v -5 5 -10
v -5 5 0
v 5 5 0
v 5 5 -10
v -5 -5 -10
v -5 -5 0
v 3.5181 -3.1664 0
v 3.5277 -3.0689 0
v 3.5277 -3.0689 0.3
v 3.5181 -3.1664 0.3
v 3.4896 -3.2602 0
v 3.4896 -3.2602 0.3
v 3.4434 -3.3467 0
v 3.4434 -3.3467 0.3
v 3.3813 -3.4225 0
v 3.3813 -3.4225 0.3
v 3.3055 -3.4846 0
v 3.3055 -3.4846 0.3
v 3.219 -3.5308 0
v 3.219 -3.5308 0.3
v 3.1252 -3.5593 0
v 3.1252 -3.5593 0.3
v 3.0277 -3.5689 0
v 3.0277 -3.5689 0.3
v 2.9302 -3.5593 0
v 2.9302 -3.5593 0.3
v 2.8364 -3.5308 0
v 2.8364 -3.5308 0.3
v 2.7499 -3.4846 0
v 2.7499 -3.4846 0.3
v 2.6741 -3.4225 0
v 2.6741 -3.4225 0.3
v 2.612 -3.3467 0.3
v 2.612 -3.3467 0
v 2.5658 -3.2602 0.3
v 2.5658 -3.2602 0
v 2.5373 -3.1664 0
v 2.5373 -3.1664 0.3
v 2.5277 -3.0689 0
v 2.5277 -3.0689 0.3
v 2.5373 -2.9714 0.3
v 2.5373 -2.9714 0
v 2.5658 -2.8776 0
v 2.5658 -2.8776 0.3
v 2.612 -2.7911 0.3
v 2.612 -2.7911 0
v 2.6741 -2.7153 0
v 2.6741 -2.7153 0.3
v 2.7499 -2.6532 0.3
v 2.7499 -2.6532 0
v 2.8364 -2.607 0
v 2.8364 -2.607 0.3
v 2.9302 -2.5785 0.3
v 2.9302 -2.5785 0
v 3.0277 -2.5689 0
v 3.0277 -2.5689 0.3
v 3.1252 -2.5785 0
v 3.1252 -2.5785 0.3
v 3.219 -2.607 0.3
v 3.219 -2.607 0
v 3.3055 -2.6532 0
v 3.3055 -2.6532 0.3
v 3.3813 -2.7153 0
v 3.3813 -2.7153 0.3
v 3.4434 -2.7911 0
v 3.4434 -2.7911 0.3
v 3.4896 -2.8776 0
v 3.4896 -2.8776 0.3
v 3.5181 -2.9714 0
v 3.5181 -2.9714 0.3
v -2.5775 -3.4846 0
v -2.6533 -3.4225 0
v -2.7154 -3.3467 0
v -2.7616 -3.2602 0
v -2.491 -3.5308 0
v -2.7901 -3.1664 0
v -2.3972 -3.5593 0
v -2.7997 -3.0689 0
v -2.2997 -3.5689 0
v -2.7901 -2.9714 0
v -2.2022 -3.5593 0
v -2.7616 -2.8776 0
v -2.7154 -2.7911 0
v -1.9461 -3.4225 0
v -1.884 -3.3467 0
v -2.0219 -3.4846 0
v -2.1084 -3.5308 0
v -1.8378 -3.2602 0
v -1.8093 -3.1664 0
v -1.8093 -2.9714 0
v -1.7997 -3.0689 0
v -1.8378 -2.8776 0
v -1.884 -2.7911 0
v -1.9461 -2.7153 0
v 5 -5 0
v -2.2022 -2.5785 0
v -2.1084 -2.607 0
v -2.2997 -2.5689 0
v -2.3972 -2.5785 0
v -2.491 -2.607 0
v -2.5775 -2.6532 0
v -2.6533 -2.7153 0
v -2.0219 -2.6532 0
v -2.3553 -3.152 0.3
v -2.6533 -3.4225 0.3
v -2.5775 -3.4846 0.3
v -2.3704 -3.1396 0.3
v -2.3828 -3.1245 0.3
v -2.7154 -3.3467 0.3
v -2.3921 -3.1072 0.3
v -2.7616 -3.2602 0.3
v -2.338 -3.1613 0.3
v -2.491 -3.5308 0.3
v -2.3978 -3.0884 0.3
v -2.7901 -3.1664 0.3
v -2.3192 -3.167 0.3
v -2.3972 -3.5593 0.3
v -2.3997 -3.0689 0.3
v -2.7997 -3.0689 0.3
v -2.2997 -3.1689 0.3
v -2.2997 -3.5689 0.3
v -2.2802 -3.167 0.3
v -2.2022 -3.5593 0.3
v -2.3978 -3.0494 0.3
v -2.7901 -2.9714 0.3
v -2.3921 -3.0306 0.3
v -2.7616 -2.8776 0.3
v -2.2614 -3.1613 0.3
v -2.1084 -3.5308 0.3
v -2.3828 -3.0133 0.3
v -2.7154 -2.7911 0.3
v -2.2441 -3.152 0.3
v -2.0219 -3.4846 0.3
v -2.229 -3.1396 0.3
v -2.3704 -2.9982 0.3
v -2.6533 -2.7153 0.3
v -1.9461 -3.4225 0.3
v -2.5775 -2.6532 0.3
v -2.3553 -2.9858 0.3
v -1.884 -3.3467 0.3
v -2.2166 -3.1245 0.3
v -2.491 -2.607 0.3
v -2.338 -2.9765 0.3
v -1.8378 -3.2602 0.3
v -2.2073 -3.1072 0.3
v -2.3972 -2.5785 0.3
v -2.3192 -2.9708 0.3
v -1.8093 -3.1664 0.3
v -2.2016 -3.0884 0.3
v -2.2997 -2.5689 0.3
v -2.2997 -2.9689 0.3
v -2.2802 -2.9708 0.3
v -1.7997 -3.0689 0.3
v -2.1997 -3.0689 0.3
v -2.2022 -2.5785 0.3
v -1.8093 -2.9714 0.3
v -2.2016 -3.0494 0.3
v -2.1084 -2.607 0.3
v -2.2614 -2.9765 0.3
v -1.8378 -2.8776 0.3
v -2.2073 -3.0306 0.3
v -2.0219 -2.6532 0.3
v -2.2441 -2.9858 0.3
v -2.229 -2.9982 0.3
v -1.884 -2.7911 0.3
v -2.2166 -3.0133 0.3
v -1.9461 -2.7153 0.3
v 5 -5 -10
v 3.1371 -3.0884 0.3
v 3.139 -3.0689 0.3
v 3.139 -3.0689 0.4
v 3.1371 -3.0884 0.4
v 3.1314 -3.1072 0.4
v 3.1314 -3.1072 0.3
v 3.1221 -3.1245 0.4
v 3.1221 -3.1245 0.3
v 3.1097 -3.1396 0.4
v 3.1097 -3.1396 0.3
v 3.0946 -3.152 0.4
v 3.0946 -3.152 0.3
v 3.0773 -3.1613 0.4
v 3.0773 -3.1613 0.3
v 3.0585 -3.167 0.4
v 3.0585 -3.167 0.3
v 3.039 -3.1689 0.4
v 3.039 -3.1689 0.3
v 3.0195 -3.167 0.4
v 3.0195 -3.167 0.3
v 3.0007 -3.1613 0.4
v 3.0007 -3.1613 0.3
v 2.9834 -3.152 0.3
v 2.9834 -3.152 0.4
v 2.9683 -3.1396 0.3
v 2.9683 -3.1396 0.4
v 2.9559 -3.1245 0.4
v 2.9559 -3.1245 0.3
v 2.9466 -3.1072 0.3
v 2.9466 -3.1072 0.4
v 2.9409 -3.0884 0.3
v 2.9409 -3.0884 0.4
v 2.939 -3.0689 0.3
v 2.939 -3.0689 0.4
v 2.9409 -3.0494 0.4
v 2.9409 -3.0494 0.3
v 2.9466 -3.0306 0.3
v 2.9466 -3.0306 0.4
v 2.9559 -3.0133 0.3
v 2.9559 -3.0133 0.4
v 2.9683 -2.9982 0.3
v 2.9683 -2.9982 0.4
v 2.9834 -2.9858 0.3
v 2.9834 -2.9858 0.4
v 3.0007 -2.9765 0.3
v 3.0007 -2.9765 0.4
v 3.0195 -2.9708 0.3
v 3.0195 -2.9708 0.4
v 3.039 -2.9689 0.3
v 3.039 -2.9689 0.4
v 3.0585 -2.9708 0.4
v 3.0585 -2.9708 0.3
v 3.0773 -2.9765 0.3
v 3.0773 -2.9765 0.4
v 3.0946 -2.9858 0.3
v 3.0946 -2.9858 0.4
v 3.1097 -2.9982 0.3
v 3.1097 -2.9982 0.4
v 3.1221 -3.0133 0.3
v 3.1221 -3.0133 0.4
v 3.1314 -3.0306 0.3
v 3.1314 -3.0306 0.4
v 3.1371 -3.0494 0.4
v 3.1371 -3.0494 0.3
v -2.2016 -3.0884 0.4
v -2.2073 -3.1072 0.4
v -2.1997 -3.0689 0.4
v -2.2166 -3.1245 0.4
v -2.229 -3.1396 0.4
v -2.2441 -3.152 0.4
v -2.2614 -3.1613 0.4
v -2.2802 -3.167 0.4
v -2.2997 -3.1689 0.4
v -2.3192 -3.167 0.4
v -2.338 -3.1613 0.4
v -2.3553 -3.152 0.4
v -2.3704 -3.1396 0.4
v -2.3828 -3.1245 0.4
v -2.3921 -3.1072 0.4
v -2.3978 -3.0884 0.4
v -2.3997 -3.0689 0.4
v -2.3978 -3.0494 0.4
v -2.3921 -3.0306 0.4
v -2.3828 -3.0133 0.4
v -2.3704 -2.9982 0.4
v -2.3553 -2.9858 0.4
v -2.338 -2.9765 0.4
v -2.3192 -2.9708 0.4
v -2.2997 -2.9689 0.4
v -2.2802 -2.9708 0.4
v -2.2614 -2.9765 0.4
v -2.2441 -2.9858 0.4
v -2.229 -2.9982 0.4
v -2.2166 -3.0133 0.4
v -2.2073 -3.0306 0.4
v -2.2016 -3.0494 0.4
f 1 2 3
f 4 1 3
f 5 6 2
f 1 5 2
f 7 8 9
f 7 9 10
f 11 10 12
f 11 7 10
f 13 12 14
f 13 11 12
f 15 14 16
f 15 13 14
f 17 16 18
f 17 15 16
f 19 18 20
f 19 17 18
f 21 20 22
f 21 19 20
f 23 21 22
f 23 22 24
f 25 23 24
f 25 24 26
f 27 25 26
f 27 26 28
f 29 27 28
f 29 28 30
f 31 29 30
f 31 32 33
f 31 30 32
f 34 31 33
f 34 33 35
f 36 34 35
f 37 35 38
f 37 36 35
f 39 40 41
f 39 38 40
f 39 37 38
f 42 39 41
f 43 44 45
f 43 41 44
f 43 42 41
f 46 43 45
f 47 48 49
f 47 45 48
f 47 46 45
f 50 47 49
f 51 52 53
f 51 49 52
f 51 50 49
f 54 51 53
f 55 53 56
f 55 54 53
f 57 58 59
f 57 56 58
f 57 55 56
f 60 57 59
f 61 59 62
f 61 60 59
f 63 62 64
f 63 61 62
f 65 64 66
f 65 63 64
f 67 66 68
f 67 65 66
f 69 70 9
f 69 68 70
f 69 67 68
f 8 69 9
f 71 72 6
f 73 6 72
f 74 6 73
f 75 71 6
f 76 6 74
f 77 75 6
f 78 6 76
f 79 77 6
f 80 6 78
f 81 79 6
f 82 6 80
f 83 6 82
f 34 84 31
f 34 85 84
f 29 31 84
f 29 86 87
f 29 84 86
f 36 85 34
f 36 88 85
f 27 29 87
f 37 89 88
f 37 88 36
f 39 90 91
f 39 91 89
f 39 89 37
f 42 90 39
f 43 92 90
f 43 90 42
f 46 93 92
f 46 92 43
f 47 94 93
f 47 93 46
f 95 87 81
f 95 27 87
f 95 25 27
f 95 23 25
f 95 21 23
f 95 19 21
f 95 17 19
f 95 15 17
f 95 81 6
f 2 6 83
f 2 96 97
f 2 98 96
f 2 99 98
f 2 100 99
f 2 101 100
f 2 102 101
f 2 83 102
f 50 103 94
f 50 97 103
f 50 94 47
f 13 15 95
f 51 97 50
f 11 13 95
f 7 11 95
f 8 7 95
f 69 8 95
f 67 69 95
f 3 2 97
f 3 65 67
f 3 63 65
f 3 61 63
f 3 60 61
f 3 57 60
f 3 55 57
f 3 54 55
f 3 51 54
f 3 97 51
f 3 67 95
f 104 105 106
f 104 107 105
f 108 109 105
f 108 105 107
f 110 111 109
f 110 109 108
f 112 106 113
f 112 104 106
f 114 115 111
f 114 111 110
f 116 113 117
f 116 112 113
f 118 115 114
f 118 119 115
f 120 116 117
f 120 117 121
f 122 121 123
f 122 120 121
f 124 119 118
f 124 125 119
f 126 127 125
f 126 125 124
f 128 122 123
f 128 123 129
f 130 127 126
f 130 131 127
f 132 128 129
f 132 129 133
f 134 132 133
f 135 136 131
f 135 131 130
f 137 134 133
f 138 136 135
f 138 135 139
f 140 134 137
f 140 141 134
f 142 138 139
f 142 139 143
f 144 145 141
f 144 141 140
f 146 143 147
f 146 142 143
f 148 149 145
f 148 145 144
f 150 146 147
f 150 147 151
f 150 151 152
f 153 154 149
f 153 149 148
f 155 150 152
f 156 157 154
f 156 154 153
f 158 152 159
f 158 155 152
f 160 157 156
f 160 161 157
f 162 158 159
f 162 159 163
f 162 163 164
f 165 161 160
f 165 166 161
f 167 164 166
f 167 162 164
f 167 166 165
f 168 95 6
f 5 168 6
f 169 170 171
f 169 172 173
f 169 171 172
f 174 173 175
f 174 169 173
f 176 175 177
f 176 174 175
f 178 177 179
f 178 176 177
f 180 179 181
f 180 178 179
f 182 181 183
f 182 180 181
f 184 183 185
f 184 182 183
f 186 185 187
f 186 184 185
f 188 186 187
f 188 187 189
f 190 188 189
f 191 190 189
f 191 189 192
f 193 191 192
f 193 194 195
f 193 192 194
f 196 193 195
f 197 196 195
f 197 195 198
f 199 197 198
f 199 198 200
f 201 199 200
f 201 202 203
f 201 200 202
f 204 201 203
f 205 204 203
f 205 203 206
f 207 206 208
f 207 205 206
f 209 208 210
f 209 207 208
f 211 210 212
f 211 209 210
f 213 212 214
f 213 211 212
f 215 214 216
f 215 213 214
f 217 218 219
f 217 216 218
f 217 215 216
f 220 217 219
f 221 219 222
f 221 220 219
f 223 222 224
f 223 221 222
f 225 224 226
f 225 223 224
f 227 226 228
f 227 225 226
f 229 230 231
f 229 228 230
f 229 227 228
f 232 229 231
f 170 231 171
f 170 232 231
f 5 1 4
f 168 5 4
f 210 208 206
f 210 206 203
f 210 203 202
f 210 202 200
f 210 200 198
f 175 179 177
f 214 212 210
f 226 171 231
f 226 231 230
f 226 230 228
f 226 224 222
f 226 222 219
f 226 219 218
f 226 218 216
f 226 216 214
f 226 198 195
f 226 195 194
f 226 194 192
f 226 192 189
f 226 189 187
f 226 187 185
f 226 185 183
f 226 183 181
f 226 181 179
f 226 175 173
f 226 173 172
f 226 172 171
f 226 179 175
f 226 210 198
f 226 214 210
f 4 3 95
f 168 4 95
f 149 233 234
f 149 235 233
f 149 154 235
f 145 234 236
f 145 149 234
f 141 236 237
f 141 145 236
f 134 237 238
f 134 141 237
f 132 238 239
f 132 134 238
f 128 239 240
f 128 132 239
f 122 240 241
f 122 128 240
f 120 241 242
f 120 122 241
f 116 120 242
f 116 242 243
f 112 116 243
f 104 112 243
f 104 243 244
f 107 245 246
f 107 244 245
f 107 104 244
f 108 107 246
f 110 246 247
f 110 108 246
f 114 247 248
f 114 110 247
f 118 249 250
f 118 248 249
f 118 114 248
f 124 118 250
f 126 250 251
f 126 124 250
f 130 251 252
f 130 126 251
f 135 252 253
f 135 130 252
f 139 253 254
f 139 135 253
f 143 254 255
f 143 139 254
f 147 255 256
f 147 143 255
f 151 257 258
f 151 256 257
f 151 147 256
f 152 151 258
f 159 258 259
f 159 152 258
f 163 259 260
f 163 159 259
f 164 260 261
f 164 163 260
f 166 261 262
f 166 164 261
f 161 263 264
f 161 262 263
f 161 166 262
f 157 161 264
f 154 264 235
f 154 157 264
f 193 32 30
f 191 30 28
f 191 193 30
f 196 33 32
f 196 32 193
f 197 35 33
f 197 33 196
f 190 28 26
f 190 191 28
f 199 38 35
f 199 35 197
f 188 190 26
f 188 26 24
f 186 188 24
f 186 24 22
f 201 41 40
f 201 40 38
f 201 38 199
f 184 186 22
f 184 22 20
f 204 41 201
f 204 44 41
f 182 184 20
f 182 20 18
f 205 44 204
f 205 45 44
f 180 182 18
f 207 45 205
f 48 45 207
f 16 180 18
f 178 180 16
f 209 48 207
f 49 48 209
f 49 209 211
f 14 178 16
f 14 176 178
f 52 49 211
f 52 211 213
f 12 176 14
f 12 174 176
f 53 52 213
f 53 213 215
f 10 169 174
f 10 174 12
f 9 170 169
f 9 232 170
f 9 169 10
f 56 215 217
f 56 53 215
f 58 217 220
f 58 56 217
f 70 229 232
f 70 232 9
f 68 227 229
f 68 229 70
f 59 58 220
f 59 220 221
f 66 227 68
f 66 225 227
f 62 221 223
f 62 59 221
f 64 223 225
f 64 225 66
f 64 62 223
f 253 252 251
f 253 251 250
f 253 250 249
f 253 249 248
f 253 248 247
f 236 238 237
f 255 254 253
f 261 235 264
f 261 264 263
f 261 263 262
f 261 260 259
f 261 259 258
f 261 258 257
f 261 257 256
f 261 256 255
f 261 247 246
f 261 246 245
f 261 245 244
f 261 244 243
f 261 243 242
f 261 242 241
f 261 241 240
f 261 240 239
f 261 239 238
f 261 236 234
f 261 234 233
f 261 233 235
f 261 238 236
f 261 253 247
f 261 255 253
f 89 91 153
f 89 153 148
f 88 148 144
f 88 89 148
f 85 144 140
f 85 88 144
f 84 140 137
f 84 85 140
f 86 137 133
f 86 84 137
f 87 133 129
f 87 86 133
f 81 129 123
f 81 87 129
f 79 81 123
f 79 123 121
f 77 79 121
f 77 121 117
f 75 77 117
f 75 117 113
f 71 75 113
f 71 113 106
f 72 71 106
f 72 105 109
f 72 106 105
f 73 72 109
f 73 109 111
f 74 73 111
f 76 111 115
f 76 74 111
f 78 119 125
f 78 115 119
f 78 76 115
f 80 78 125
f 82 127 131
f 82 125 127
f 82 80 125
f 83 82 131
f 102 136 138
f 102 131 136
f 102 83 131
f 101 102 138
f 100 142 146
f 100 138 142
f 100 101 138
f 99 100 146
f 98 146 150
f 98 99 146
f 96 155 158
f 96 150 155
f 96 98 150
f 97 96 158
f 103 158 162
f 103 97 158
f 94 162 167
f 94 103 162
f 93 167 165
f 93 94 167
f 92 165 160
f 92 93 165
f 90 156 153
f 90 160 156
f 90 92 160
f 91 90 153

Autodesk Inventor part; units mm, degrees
ref_plane "YZ Plane" through (0, 0, 0) normal (1, 0, 0) x (0, 1, 0)
ref_plane "XZ Plane" through (0, 0, 0) normal (0, 1, 0) x (-1, 0, 0)
sketch "Эскиз1" plane through (0, 0, 0) normal (0, 0, 1) x (1, 0, 0)
  line L0 (-5, 5) -> (5, 5)
  line L1 (5, 5) -> (5, -5)
  line L2 (5, -5) -> (-5, -5)
  line L3 (-5, -5) -> (-5, 5)
  point P0 (0, 0)
  point P1 (0, 5)
  point P2 (5, 0)
  dimension "d0" = 10
  dimension "d1" = 10
extrude "Выдавливание1" add sketch "Эскиз1" against normal blind 10
sketch "Эскиз2" plane through (0, 0, 0) normal (0, 0, 1) x (1, 0, 0)
  line L0 (-4.6144, 4.1403) -> (8.1453, 4.1403) construction
  line L1 (8.1453, 4.1403) -> (8.1453, 2.1383) construction
  line L2 (8.1453, 2.1383) -> (-4.6144, 2.1383) construction
  line L3 (-4.6144, 2.1383) -> (-4.6144, 4.1403) construction
  point P0 (0, 0)
ref_plane "РабПлоскость1" through (0, 0, 0) normal (0, 0, 1) x (1, 0, 0)
sketch "Эскиз3" plane through (0, 0, 0) normal (0, 0, 1) x (1, 0, 0)
  circle A0 centre (-2.2997, -3.0689) radius 0.5
  circle A1 centre (3.0277, -3.0689) radius 0.5
  point P0 (0, 0)
  dimension "d5" = 1
  dimension "d6" = 1
extrude "Выдавливание2" add sketch "Эскиз3" along normal blind 0.3
sketch "Эскиз4" plane through (0, 0, 0) normal (0, 0, 1) x (1, 0, 0)
  circle A0 centre (-2.2997, -3.0689) radius 0.5 projected
  circle A1 centre (-2.2997, -3.0689) radius 0.1
  circle A2 centre (3.039, -3.0689) radius 0.1
  point P0 (0, 0)
  dimension "d9" = 0.2
  dimension "d10" = 0.2
extrude "Выдавливание3" add sketch "Эскиз4" along normal blind 0.4 contours A1 | A2
properties part number "rf-generator"
